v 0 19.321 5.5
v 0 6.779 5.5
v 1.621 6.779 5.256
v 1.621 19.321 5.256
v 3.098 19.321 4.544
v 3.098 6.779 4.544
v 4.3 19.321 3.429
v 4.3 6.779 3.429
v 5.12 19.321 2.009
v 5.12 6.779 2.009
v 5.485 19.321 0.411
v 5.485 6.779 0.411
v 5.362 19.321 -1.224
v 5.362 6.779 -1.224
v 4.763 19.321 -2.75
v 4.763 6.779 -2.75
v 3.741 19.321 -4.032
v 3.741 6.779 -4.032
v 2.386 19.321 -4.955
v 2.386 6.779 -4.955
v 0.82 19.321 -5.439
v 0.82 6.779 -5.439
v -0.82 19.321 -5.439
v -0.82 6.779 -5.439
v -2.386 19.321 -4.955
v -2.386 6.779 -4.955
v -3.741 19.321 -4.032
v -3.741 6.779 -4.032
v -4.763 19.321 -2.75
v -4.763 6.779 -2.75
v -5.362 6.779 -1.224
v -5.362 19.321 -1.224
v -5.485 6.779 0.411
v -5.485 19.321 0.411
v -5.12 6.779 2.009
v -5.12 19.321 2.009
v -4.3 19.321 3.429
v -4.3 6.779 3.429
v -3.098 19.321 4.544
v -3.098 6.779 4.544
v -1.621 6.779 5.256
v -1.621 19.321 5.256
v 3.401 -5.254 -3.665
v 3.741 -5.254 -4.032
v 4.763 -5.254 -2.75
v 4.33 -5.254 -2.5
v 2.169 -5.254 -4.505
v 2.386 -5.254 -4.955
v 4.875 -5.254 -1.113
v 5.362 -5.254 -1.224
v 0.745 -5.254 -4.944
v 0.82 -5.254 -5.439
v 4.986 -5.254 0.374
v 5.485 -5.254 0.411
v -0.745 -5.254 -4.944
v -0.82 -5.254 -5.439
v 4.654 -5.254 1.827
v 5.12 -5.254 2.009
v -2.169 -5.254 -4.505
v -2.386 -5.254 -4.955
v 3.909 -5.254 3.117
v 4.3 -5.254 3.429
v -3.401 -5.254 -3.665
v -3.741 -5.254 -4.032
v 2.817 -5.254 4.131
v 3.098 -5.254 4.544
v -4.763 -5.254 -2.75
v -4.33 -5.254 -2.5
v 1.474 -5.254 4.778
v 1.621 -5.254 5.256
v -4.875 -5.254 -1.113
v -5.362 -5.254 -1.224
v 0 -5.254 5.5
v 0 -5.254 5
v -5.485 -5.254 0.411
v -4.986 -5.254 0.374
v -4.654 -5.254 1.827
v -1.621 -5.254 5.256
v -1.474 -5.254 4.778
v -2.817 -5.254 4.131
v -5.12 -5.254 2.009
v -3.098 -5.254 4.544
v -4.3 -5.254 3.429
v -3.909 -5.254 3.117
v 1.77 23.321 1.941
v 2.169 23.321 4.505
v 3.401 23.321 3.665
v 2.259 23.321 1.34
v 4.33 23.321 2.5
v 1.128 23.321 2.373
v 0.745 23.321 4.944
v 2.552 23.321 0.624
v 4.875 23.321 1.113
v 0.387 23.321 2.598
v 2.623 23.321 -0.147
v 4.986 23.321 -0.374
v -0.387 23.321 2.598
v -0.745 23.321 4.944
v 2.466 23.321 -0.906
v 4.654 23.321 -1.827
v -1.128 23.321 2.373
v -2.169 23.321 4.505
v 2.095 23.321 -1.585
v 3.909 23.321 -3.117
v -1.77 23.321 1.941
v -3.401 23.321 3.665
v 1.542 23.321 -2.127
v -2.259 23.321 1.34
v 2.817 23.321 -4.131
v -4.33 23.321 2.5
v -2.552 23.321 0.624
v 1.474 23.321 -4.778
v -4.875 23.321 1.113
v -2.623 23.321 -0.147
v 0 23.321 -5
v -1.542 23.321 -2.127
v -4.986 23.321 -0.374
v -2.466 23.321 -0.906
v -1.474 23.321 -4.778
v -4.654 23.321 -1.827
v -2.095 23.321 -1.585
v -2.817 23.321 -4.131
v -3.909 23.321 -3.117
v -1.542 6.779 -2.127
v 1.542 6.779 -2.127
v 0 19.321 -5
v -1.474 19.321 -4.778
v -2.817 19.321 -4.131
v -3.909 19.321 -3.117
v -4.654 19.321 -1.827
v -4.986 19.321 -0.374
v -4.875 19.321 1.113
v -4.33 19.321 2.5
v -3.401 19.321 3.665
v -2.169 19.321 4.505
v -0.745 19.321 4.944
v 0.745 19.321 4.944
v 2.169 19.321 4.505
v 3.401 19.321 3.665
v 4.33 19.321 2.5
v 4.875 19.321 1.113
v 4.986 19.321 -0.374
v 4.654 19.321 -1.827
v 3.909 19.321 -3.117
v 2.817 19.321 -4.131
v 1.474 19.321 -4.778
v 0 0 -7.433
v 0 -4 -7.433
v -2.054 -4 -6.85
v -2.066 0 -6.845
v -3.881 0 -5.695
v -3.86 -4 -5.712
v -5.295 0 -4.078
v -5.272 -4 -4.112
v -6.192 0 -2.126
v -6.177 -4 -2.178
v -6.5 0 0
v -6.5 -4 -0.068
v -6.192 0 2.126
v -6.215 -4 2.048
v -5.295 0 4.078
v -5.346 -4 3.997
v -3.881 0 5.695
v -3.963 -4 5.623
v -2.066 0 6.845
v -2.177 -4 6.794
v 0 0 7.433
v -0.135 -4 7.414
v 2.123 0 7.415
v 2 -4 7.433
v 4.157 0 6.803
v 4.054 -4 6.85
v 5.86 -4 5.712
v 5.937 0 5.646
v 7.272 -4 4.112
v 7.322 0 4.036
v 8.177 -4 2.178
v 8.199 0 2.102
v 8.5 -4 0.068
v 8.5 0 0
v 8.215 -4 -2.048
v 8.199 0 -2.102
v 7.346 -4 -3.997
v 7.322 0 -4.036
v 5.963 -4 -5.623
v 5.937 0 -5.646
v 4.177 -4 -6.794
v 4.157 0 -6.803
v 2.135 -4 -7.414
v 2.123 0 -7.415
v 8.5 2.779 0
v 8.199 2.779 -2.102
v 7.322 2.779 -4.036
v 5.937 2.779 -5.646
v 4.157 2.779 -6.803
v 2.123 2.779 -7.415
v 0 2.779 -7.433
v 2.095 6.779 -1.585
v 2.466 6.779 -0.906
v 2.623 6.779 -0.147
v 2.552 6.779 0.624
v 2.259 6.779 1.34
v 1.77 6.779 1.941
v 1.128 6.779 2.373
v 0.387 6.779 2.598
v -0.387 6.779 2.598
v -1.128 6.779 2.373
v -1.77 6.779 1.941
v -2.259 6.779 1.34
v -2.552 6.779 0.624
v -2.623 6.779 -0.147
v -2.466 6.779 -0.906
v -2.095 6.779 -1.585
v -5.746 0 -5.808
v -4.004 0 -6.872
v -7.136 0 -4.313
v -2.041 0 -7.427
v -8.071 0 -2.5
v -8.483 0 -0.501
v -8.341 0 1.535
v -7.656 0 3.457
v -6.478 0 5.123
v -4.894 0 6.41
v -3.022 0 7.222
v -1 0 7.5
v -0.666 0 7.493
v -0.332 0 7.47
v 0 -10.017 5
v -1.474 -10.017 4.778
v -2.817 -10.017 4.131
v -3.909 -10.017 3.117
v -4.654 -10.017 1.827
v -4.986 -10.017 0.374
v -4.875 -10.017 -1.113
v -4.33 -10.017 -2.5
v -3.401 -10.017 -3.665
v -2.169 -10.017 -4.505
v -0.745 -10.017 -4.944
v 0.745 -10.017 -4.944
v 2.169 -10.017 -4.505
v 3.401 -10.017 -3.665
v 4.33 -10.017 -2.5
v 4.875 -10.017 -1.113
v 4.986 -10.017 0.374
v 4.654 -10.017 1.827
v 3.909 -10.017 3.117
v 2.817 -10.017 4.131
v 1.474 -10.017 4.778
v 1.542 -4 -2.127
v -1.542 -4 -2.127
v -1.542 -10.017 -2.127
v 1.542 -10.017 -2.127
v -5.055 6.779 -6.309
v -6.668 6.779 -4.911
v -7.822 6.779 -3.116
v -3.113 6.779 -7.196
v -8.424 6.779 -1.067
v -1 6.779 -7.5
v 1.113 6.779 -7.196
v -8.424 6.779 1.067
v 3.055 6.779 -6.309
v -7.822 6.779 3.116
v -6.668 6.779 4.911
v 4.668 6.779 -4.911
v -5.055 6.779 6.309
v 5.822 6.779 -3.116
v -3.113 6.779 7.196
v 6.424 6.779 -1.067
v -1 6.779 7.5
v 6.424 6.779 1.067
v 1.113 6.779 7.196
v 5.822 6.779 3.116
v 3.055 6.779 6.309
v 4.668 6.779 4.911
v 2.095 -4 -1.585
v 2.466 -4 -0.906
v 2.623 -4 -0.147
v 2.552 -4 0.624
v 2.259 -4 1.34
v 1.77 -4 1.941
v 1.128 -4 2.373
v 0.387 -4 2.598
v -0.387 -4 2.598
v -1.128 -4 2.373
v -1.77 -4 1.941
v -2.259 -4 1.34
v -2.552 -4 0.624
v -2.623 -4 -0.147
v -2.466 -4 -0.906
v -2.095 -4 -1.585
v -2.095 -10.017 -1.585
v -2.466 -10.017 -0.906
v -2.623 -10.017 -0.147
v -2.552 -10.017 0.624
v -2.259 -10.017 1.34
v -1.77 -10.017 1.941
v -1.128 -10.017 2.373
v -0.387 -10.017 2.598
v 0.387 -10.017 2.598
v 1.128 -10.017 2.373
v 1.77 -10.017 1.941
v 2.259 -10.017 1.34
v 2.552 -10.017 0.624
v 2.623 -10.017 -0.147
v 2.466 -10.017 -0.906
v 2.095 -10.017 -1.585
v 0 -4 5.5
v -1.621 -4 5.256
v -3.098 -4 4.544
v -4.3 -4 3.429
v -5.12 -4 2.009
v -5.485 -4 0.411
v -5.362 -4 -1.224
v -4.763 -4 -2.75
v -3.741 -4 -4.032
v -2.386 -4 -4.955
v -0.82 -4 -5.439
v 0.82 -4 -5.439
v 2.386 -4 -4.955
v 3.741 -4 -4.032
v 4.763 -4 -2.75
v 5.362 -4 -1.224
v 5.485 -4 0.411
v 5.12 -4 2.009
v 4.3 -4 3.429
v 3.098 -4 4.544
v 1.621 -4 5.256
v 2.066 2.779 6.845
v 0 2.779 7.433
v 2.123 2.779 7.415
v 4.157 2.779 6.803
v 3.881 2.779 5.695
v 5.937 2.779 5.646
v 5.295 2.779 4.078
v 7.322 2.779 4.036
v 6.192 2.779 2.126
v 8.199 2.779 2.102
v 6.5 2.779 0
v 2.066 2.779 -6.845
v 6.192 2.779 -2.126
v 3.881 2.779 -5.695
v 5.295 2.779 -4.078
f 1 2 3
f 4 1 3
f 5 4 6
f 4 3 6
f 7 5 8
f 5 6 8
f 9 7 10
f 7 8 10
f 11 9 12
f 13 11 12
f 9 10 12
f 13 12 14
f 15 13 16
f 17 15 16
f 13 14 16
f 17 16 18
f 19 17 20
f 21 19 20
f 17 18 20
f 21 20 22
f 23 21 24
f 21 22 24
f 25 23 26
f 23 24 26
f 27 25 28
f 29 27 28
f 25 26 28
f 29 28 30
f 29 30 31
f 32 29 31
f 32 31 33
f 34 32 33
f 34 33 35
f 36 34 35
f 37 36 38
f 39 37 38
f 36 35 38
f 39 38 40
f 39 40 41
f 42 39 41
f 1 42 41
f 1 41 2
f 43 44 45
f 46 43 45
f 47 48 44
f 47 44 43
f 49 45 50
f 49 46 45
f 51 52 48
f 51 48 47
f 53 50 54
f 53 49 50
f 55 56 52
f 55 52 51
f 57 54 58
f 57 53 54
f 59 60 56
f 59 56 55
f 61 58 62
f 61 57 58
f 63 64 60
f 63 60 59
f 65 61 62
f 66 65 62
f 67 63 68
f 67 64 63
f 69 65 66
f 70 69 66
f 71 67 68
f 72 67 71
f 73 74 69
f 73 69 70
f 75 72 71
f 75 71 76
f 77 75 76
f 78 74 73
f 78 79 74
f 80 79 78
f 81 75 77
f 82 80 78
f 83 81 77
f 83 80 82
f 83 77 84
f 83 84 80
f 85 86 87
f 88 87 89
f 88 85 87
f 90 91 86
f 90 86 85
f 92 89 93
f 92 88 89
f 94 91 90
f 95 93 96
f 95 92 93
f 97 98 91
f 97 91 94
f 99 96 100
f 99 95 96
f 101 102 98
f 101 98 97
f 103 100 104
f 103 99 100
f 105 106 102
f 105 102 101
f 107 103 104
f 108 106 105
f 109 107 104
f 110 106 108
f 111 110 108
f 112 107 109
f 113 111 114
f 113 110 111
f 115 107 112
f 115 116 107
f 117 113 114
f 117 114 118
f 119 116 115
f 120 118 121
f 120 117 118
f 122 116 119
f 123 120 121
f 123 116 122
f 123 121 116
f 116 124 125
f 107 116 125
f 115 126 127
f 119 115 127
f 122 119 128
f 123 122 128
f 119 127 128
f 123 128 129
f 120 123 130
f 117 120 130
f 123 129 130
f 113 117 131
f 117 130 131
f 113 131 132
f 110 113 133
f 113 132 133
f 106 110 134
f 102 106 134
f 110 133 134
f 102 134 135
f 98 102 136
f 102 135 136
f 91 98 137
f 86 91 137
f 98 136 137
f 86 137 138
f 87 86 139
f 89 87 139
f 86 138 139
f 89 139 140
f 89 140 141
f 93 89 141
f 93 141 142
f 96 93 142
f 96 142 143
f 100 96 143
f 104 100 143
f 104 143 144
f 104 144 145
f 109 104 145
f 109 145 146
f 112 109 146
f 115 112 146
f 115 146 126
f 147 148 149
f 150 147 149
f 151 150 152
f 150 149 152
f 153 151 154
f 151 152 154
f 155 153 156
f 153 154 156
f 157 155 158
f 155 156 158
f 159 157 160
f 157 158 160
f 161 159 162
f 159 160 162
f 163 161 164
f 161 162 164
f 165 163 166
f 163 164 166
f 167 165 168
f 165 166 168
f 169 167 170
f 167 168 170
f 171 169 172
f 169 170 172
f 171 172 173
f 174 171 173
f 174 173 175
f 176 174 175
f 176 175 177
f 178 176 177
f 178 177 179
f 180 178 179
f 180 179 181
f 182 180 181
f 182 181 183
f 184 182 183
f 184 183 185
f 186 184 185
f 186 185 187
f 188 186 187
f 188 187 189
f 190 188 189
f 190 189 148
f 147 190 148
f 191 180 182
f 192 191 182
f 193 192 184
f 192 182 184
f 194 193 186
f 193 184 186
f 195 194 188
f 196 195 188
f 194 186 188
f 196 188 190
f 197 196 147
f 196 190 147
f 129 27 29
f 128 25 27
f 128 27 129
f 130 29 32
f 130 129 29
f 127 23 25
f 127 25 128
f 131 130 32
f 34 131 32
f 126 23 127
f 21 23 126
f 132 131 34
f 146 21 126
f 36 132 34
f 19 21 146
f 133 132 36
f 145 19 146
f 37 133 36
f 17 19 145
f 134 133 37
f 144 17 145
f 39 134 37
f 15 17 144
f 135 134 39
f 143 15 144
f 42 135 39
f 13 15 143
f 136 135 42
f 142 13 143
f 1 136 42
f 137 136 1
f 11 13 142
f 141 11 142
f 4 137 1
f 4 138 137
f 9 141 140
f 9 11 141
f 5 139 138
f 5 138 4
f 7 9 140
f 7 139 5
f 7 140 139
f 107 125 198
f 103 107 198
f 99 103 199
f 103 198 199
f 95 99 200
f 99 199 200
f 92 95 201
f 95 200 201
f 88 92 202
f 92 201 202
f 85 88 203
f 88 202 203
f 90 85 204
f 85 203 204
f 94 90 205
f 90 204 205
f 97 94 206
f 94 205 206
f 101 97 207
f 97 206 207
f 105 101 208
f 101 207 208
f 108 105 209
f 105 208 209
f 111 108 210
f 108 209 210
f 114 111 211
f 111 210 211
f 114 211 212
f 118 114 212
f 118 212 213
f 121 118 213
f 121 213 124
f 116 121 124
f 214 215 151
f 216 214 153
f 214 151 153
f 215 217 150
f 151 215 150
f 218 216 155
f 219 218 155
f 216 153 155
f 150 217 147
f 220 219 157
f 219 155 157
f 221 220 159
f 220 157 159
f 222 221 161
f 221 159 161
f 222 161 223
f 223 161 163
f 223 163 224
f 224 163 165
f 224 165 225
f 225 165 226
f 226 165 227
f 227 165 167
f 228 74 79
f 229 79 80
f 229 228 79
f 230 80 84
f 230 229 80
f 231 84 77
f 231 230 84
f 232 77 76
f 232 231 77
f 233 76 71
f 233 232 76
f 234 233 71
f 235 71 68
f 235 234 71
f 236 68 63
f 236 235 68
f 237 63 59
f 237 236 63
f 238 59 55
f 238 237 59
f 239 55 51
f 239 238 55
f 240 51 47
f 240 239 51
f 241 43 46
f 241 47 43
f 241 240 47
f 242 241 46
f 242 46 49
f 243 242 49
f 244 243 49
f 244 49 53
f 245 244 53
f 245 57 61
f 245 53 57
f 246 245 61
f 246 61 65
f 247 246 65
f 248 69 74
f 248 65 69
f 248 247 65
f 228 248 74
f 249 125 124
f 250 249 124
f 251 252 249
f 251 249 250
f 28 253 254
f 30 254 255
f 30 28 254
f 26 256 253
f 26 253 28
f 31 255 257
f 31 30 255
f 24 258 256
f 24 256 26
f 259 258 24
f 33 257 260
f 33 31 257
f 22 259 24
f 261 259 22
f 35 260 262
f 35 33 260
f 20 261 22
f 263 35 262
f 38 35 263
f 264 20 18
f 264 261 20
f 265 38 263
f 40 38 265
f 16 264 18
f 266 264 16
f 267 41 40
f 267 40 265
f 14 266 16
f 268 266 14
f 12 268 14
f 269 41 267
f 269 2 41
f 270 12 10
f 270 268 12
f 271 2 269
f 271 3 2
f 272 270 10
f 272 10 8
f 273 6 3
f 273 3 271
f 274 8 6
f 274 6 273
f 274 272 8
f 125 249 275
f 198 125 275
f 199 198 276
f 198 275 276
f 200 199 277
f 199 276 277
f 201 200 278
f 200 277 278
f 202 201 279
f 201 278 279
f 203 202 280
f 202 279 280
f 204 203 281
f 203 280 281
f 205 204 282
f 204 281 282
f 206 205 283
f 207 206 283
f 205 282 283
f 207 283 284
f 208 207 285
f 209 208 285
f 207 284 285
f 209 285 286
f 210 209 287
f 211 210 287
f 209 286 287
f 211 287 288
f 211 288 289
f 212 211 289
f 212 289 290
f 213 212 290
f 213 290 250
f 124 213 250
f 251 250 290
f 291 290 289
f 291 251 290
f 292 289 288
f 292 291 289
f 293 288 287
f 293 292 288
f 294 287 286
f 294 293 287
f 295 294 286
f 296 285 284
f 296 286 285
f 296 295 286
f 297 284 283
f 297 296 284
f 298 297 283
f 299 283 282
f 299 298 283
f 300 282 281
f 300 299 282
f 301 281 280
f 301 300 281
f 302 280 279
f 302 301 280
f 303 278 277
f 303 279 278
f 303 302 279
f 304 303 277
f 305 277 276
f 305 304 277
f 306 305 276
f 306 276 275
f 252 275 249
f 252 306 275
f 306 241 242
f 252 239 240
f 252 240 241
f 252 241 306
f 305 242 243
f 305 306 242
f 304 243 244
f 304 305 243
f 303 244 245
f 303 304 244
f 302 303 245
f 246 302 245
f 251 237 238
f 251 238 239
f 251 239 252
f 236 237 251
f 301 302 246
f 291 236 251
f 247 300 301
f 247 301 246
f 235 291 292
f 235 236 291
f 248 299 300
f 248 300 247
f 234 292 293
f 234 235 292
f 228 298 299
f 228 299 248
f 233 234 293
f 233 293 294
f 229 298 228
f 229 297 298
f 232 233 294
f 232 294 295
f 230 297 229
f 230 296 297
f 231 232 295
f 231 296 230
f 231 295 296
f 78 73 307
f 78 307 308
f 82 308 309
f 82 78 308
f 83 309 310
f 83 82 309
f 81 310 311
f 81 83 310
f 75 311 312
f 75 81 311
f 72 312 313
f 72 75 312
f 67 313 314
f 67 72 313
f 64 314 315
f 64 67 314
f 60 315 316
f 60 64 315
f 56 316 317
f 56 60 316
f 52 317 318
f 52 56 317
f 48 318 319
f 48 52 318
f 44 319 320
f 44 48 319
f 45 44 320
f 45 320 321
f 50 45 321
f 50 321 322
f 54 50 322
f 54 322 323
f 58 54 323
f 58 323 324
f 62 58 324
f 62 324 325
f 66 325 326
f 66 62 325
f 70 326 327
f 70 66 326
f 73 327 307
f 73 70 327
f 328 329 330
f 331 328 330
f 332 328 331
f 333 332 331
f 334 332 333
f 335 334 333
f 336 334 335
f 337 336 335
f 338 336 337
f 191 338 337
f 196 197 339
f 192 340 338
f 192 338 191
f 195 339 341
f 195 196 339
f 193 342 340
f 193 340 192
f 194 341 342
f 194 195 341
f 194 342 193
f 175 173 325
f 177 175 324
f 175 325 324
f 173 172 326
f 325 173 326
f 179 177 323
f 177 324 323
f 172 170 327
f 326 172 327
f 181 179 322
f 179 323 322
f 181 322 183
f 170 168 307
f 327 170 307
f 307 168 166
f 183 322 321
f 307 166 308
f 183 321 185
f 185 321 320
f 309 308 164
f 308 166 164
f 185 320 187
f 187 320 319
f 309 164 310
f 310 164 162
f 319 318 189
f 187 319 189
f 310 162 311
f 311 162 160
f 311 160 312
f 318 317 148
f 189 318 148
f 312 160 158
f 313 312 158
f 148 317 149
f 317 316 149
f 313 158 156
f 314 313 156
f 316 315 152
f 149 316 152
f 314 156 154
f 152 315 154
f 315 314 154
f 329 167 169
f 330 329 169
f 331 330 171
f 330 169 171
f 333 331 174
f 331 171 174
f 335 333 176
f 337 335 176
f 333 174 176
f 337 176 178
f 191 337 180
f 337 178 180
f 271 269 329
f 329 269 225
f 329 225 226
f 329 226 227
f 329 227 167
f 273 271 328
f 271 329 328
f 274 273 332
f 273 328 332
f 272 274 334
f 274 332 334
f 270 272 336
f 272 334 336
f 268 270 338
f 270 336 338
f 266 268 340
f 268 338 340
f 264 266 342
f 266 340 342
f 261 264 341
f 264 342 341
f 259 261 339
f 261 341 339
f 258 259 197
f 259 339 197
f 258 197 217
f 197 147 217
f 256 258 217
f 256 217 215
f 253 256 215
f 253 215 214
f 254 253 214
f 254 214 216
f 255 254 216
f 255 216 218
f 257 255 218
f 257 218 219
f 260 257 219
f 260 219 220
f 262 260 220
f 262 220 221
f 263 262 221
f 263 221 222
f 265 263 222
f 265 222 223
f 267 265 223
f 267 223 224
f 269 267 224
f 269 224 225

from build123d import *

# Parameters (mm, degrees)
SKETCH1_R            = 7.5
BOSS_EXTRUDE1_DEPTH  = 6.779166667
BOSS_EXTRUDE2_DEPTH  = 2.779166667
BOSS_EXTRUDE3_START  = -4
SKETCH1_4_R          = 7.5
BOSS_EXTRUDE3_DEPTH  = 4
BOSS_EXTRUDE4_START  = 6.016666667
SKETCH2_R            = 5
BOSS_EXTRUDE4_DEPTH  = 6.016666667
BOSS_EXTRUDE5_START  = 1.254166667
SKETCH2_3_R          = 5.5
SKETCH2_3_R_2        = 5
BOSS_EXTRUDE5_DEPTH  = 1.254166667
SKETCH3_R            = 5
BOSS_EXTRUDE9_DEPTH  = 16.541666667
SKETCH3_3_R          = 5.5
SKETCH3_3_R_2        = 5
BOSS_EXTRUDE10_DEPTH = 12.541666667


with BuildPart() as part:
    # Sketch1 → Boss-Extrude1 (new body)
    with BuildSketch(Plane(origin=(0, 0, 0), x_dir=(1, 0, 0), z_dir=(0, 1, 0))):
        with Locations(Location((-1, 0, 0), (0, 0, 270))):
            Circle(SKETCH1_R)
        with BuildLine():
            Line((-1.54175225, 2.127), (1.54175225, 2.127))
            ThreePointArc((1.54175225, 2.127), (0, -2.627), (-1.54175225, 2.127))
        make_face(mode=Mode.SUBTRACT)
    extrude(amount=BOSS_EXTRUDE1_DEPTH)

    # Sketch1<3> → Boss-Extrude2 (add)
    with BuildSketch(Plane(origin=(0, 0, 0), x_dir=(1, 0, 0), z_dir=(0, 1, 0))):
        with BuildLine():
            ThreePointArc((0, -7.433034374), (5.937104415, -5.645794895), (8.5, 0))
            ThreePointArc((8.5, 0), (5.937104415, 5.645794895), (0, 7.433034374))
            ThreePointArc((0, 7.433034374), (4.645794895, 4.937104415), (6.5, 0))
            ThreePointArc((6.5, 0), (4.645794895, -4.937104415), (0, -7.433034374))
        make_face()
    extrude(amount=BOSS_EXTRUDE2_DEPTH)

    # Sketch1<4> → Boss-Extrude3 (add)
    with BuildSketch(Plane(origin=(0, 0, 0), x_dir=(1, 0, 0), z_dir=(0, 1, 0)).offset(BOSS_EXTRUDE3_START)):
        with Locations(Location((1, 0, 0), (0, 0, 97.662255661))):
            Circle(SKETCH1_4_R)
        with BuildLine():
            Line((-1.54175225, 2.127), (1.54175225, 2.127))
            ThreePointArc((1.54175225, 2.127), (0, -2.627), (-1.54175225, 2.127))
        make_face(mode=Mode.SUBTRACT)
    extrude(amount=BOSS_EXTRUDE3_DEPTH)

    # Sketch2 → Boss-Extrude4 (add)
    with BuildSketch(Plane.XZ.offset(4).offset(BOSS_EXTRUDE4_START)):
        with Locations(Location((0, 0, 0), (0, 0, 90))):
            Circle(SKETCH2_R)
        with BuildLine():
            ThreePointArc((-1.54175225, -2.127), (0, 2.627), (1.54175225, -2.127))
            Line((1.54175225, -2.127), (-1.54175225, -2.127))
        make_face(mode=Mode.SUBTRACT)
    extrude(amount=-BOSS_EXTRUDE4_DEPTH)

    # Sketch2<3> → Boss-Extrude5 (add)
    with BuildSketch(Plane.XZ.offset(4).offset(BOSS_EXTRUDE5_START)):
        with Locations(Location((0, 0, 0), (0, 0, 90))):
            Circle(SKETCH2_3_R)
        with Locations(Location((0, 0, 0), (0, 0, 270))):
            Circle(SKETCH2_3_R_2, mode=Mode.SUBTRACT)
    extrude(amount=-BOSS_EXTRUDE5_DEPTH)

    # Sketch3 → Boss-Extrude9 (add)
    with BuildSketch(Plane(origin=(0, 6.779166667, 0), x_dir=(1, 0, 0), z_dir=(0, 1, 0))):
        with Locations(Location((0, 0, 0), (0, 0, 90))):
            Circle(SKETCH3_R)
        with BuildLine():
            Line((-1.54175225, 2.127), (1.54175225, 2.127))
            ThreePointArc((1.54175225, 2.127), (0, -2.627), (-1.54175225, 2.127))
        make_face(mode=Mode.SUBTRACT)
    extrude(amount=BOSS_EXTRUDE9_DEPTH)

    # Sketch3<3> → Boss-Extrude10 (add)
    with BuildSketch(Plane(origin=(0, 6.779166667, 0), x_dir=(1, 0, 0), z_dir=(0, 1, 0))):
        with Locations(Location((0, 0, 0), (0, 0, 270))):
            Circle(SKETCH3_3_R)
        with Locations(Location((0, 0, 0), (0, 0, 90))):
            Circle(SKETCH3_3_R_2, mode=Mode.SUBTRACT)
    extrude(amount=BOSS_EXTRUDE10_DEPTH)


solid = part.part
